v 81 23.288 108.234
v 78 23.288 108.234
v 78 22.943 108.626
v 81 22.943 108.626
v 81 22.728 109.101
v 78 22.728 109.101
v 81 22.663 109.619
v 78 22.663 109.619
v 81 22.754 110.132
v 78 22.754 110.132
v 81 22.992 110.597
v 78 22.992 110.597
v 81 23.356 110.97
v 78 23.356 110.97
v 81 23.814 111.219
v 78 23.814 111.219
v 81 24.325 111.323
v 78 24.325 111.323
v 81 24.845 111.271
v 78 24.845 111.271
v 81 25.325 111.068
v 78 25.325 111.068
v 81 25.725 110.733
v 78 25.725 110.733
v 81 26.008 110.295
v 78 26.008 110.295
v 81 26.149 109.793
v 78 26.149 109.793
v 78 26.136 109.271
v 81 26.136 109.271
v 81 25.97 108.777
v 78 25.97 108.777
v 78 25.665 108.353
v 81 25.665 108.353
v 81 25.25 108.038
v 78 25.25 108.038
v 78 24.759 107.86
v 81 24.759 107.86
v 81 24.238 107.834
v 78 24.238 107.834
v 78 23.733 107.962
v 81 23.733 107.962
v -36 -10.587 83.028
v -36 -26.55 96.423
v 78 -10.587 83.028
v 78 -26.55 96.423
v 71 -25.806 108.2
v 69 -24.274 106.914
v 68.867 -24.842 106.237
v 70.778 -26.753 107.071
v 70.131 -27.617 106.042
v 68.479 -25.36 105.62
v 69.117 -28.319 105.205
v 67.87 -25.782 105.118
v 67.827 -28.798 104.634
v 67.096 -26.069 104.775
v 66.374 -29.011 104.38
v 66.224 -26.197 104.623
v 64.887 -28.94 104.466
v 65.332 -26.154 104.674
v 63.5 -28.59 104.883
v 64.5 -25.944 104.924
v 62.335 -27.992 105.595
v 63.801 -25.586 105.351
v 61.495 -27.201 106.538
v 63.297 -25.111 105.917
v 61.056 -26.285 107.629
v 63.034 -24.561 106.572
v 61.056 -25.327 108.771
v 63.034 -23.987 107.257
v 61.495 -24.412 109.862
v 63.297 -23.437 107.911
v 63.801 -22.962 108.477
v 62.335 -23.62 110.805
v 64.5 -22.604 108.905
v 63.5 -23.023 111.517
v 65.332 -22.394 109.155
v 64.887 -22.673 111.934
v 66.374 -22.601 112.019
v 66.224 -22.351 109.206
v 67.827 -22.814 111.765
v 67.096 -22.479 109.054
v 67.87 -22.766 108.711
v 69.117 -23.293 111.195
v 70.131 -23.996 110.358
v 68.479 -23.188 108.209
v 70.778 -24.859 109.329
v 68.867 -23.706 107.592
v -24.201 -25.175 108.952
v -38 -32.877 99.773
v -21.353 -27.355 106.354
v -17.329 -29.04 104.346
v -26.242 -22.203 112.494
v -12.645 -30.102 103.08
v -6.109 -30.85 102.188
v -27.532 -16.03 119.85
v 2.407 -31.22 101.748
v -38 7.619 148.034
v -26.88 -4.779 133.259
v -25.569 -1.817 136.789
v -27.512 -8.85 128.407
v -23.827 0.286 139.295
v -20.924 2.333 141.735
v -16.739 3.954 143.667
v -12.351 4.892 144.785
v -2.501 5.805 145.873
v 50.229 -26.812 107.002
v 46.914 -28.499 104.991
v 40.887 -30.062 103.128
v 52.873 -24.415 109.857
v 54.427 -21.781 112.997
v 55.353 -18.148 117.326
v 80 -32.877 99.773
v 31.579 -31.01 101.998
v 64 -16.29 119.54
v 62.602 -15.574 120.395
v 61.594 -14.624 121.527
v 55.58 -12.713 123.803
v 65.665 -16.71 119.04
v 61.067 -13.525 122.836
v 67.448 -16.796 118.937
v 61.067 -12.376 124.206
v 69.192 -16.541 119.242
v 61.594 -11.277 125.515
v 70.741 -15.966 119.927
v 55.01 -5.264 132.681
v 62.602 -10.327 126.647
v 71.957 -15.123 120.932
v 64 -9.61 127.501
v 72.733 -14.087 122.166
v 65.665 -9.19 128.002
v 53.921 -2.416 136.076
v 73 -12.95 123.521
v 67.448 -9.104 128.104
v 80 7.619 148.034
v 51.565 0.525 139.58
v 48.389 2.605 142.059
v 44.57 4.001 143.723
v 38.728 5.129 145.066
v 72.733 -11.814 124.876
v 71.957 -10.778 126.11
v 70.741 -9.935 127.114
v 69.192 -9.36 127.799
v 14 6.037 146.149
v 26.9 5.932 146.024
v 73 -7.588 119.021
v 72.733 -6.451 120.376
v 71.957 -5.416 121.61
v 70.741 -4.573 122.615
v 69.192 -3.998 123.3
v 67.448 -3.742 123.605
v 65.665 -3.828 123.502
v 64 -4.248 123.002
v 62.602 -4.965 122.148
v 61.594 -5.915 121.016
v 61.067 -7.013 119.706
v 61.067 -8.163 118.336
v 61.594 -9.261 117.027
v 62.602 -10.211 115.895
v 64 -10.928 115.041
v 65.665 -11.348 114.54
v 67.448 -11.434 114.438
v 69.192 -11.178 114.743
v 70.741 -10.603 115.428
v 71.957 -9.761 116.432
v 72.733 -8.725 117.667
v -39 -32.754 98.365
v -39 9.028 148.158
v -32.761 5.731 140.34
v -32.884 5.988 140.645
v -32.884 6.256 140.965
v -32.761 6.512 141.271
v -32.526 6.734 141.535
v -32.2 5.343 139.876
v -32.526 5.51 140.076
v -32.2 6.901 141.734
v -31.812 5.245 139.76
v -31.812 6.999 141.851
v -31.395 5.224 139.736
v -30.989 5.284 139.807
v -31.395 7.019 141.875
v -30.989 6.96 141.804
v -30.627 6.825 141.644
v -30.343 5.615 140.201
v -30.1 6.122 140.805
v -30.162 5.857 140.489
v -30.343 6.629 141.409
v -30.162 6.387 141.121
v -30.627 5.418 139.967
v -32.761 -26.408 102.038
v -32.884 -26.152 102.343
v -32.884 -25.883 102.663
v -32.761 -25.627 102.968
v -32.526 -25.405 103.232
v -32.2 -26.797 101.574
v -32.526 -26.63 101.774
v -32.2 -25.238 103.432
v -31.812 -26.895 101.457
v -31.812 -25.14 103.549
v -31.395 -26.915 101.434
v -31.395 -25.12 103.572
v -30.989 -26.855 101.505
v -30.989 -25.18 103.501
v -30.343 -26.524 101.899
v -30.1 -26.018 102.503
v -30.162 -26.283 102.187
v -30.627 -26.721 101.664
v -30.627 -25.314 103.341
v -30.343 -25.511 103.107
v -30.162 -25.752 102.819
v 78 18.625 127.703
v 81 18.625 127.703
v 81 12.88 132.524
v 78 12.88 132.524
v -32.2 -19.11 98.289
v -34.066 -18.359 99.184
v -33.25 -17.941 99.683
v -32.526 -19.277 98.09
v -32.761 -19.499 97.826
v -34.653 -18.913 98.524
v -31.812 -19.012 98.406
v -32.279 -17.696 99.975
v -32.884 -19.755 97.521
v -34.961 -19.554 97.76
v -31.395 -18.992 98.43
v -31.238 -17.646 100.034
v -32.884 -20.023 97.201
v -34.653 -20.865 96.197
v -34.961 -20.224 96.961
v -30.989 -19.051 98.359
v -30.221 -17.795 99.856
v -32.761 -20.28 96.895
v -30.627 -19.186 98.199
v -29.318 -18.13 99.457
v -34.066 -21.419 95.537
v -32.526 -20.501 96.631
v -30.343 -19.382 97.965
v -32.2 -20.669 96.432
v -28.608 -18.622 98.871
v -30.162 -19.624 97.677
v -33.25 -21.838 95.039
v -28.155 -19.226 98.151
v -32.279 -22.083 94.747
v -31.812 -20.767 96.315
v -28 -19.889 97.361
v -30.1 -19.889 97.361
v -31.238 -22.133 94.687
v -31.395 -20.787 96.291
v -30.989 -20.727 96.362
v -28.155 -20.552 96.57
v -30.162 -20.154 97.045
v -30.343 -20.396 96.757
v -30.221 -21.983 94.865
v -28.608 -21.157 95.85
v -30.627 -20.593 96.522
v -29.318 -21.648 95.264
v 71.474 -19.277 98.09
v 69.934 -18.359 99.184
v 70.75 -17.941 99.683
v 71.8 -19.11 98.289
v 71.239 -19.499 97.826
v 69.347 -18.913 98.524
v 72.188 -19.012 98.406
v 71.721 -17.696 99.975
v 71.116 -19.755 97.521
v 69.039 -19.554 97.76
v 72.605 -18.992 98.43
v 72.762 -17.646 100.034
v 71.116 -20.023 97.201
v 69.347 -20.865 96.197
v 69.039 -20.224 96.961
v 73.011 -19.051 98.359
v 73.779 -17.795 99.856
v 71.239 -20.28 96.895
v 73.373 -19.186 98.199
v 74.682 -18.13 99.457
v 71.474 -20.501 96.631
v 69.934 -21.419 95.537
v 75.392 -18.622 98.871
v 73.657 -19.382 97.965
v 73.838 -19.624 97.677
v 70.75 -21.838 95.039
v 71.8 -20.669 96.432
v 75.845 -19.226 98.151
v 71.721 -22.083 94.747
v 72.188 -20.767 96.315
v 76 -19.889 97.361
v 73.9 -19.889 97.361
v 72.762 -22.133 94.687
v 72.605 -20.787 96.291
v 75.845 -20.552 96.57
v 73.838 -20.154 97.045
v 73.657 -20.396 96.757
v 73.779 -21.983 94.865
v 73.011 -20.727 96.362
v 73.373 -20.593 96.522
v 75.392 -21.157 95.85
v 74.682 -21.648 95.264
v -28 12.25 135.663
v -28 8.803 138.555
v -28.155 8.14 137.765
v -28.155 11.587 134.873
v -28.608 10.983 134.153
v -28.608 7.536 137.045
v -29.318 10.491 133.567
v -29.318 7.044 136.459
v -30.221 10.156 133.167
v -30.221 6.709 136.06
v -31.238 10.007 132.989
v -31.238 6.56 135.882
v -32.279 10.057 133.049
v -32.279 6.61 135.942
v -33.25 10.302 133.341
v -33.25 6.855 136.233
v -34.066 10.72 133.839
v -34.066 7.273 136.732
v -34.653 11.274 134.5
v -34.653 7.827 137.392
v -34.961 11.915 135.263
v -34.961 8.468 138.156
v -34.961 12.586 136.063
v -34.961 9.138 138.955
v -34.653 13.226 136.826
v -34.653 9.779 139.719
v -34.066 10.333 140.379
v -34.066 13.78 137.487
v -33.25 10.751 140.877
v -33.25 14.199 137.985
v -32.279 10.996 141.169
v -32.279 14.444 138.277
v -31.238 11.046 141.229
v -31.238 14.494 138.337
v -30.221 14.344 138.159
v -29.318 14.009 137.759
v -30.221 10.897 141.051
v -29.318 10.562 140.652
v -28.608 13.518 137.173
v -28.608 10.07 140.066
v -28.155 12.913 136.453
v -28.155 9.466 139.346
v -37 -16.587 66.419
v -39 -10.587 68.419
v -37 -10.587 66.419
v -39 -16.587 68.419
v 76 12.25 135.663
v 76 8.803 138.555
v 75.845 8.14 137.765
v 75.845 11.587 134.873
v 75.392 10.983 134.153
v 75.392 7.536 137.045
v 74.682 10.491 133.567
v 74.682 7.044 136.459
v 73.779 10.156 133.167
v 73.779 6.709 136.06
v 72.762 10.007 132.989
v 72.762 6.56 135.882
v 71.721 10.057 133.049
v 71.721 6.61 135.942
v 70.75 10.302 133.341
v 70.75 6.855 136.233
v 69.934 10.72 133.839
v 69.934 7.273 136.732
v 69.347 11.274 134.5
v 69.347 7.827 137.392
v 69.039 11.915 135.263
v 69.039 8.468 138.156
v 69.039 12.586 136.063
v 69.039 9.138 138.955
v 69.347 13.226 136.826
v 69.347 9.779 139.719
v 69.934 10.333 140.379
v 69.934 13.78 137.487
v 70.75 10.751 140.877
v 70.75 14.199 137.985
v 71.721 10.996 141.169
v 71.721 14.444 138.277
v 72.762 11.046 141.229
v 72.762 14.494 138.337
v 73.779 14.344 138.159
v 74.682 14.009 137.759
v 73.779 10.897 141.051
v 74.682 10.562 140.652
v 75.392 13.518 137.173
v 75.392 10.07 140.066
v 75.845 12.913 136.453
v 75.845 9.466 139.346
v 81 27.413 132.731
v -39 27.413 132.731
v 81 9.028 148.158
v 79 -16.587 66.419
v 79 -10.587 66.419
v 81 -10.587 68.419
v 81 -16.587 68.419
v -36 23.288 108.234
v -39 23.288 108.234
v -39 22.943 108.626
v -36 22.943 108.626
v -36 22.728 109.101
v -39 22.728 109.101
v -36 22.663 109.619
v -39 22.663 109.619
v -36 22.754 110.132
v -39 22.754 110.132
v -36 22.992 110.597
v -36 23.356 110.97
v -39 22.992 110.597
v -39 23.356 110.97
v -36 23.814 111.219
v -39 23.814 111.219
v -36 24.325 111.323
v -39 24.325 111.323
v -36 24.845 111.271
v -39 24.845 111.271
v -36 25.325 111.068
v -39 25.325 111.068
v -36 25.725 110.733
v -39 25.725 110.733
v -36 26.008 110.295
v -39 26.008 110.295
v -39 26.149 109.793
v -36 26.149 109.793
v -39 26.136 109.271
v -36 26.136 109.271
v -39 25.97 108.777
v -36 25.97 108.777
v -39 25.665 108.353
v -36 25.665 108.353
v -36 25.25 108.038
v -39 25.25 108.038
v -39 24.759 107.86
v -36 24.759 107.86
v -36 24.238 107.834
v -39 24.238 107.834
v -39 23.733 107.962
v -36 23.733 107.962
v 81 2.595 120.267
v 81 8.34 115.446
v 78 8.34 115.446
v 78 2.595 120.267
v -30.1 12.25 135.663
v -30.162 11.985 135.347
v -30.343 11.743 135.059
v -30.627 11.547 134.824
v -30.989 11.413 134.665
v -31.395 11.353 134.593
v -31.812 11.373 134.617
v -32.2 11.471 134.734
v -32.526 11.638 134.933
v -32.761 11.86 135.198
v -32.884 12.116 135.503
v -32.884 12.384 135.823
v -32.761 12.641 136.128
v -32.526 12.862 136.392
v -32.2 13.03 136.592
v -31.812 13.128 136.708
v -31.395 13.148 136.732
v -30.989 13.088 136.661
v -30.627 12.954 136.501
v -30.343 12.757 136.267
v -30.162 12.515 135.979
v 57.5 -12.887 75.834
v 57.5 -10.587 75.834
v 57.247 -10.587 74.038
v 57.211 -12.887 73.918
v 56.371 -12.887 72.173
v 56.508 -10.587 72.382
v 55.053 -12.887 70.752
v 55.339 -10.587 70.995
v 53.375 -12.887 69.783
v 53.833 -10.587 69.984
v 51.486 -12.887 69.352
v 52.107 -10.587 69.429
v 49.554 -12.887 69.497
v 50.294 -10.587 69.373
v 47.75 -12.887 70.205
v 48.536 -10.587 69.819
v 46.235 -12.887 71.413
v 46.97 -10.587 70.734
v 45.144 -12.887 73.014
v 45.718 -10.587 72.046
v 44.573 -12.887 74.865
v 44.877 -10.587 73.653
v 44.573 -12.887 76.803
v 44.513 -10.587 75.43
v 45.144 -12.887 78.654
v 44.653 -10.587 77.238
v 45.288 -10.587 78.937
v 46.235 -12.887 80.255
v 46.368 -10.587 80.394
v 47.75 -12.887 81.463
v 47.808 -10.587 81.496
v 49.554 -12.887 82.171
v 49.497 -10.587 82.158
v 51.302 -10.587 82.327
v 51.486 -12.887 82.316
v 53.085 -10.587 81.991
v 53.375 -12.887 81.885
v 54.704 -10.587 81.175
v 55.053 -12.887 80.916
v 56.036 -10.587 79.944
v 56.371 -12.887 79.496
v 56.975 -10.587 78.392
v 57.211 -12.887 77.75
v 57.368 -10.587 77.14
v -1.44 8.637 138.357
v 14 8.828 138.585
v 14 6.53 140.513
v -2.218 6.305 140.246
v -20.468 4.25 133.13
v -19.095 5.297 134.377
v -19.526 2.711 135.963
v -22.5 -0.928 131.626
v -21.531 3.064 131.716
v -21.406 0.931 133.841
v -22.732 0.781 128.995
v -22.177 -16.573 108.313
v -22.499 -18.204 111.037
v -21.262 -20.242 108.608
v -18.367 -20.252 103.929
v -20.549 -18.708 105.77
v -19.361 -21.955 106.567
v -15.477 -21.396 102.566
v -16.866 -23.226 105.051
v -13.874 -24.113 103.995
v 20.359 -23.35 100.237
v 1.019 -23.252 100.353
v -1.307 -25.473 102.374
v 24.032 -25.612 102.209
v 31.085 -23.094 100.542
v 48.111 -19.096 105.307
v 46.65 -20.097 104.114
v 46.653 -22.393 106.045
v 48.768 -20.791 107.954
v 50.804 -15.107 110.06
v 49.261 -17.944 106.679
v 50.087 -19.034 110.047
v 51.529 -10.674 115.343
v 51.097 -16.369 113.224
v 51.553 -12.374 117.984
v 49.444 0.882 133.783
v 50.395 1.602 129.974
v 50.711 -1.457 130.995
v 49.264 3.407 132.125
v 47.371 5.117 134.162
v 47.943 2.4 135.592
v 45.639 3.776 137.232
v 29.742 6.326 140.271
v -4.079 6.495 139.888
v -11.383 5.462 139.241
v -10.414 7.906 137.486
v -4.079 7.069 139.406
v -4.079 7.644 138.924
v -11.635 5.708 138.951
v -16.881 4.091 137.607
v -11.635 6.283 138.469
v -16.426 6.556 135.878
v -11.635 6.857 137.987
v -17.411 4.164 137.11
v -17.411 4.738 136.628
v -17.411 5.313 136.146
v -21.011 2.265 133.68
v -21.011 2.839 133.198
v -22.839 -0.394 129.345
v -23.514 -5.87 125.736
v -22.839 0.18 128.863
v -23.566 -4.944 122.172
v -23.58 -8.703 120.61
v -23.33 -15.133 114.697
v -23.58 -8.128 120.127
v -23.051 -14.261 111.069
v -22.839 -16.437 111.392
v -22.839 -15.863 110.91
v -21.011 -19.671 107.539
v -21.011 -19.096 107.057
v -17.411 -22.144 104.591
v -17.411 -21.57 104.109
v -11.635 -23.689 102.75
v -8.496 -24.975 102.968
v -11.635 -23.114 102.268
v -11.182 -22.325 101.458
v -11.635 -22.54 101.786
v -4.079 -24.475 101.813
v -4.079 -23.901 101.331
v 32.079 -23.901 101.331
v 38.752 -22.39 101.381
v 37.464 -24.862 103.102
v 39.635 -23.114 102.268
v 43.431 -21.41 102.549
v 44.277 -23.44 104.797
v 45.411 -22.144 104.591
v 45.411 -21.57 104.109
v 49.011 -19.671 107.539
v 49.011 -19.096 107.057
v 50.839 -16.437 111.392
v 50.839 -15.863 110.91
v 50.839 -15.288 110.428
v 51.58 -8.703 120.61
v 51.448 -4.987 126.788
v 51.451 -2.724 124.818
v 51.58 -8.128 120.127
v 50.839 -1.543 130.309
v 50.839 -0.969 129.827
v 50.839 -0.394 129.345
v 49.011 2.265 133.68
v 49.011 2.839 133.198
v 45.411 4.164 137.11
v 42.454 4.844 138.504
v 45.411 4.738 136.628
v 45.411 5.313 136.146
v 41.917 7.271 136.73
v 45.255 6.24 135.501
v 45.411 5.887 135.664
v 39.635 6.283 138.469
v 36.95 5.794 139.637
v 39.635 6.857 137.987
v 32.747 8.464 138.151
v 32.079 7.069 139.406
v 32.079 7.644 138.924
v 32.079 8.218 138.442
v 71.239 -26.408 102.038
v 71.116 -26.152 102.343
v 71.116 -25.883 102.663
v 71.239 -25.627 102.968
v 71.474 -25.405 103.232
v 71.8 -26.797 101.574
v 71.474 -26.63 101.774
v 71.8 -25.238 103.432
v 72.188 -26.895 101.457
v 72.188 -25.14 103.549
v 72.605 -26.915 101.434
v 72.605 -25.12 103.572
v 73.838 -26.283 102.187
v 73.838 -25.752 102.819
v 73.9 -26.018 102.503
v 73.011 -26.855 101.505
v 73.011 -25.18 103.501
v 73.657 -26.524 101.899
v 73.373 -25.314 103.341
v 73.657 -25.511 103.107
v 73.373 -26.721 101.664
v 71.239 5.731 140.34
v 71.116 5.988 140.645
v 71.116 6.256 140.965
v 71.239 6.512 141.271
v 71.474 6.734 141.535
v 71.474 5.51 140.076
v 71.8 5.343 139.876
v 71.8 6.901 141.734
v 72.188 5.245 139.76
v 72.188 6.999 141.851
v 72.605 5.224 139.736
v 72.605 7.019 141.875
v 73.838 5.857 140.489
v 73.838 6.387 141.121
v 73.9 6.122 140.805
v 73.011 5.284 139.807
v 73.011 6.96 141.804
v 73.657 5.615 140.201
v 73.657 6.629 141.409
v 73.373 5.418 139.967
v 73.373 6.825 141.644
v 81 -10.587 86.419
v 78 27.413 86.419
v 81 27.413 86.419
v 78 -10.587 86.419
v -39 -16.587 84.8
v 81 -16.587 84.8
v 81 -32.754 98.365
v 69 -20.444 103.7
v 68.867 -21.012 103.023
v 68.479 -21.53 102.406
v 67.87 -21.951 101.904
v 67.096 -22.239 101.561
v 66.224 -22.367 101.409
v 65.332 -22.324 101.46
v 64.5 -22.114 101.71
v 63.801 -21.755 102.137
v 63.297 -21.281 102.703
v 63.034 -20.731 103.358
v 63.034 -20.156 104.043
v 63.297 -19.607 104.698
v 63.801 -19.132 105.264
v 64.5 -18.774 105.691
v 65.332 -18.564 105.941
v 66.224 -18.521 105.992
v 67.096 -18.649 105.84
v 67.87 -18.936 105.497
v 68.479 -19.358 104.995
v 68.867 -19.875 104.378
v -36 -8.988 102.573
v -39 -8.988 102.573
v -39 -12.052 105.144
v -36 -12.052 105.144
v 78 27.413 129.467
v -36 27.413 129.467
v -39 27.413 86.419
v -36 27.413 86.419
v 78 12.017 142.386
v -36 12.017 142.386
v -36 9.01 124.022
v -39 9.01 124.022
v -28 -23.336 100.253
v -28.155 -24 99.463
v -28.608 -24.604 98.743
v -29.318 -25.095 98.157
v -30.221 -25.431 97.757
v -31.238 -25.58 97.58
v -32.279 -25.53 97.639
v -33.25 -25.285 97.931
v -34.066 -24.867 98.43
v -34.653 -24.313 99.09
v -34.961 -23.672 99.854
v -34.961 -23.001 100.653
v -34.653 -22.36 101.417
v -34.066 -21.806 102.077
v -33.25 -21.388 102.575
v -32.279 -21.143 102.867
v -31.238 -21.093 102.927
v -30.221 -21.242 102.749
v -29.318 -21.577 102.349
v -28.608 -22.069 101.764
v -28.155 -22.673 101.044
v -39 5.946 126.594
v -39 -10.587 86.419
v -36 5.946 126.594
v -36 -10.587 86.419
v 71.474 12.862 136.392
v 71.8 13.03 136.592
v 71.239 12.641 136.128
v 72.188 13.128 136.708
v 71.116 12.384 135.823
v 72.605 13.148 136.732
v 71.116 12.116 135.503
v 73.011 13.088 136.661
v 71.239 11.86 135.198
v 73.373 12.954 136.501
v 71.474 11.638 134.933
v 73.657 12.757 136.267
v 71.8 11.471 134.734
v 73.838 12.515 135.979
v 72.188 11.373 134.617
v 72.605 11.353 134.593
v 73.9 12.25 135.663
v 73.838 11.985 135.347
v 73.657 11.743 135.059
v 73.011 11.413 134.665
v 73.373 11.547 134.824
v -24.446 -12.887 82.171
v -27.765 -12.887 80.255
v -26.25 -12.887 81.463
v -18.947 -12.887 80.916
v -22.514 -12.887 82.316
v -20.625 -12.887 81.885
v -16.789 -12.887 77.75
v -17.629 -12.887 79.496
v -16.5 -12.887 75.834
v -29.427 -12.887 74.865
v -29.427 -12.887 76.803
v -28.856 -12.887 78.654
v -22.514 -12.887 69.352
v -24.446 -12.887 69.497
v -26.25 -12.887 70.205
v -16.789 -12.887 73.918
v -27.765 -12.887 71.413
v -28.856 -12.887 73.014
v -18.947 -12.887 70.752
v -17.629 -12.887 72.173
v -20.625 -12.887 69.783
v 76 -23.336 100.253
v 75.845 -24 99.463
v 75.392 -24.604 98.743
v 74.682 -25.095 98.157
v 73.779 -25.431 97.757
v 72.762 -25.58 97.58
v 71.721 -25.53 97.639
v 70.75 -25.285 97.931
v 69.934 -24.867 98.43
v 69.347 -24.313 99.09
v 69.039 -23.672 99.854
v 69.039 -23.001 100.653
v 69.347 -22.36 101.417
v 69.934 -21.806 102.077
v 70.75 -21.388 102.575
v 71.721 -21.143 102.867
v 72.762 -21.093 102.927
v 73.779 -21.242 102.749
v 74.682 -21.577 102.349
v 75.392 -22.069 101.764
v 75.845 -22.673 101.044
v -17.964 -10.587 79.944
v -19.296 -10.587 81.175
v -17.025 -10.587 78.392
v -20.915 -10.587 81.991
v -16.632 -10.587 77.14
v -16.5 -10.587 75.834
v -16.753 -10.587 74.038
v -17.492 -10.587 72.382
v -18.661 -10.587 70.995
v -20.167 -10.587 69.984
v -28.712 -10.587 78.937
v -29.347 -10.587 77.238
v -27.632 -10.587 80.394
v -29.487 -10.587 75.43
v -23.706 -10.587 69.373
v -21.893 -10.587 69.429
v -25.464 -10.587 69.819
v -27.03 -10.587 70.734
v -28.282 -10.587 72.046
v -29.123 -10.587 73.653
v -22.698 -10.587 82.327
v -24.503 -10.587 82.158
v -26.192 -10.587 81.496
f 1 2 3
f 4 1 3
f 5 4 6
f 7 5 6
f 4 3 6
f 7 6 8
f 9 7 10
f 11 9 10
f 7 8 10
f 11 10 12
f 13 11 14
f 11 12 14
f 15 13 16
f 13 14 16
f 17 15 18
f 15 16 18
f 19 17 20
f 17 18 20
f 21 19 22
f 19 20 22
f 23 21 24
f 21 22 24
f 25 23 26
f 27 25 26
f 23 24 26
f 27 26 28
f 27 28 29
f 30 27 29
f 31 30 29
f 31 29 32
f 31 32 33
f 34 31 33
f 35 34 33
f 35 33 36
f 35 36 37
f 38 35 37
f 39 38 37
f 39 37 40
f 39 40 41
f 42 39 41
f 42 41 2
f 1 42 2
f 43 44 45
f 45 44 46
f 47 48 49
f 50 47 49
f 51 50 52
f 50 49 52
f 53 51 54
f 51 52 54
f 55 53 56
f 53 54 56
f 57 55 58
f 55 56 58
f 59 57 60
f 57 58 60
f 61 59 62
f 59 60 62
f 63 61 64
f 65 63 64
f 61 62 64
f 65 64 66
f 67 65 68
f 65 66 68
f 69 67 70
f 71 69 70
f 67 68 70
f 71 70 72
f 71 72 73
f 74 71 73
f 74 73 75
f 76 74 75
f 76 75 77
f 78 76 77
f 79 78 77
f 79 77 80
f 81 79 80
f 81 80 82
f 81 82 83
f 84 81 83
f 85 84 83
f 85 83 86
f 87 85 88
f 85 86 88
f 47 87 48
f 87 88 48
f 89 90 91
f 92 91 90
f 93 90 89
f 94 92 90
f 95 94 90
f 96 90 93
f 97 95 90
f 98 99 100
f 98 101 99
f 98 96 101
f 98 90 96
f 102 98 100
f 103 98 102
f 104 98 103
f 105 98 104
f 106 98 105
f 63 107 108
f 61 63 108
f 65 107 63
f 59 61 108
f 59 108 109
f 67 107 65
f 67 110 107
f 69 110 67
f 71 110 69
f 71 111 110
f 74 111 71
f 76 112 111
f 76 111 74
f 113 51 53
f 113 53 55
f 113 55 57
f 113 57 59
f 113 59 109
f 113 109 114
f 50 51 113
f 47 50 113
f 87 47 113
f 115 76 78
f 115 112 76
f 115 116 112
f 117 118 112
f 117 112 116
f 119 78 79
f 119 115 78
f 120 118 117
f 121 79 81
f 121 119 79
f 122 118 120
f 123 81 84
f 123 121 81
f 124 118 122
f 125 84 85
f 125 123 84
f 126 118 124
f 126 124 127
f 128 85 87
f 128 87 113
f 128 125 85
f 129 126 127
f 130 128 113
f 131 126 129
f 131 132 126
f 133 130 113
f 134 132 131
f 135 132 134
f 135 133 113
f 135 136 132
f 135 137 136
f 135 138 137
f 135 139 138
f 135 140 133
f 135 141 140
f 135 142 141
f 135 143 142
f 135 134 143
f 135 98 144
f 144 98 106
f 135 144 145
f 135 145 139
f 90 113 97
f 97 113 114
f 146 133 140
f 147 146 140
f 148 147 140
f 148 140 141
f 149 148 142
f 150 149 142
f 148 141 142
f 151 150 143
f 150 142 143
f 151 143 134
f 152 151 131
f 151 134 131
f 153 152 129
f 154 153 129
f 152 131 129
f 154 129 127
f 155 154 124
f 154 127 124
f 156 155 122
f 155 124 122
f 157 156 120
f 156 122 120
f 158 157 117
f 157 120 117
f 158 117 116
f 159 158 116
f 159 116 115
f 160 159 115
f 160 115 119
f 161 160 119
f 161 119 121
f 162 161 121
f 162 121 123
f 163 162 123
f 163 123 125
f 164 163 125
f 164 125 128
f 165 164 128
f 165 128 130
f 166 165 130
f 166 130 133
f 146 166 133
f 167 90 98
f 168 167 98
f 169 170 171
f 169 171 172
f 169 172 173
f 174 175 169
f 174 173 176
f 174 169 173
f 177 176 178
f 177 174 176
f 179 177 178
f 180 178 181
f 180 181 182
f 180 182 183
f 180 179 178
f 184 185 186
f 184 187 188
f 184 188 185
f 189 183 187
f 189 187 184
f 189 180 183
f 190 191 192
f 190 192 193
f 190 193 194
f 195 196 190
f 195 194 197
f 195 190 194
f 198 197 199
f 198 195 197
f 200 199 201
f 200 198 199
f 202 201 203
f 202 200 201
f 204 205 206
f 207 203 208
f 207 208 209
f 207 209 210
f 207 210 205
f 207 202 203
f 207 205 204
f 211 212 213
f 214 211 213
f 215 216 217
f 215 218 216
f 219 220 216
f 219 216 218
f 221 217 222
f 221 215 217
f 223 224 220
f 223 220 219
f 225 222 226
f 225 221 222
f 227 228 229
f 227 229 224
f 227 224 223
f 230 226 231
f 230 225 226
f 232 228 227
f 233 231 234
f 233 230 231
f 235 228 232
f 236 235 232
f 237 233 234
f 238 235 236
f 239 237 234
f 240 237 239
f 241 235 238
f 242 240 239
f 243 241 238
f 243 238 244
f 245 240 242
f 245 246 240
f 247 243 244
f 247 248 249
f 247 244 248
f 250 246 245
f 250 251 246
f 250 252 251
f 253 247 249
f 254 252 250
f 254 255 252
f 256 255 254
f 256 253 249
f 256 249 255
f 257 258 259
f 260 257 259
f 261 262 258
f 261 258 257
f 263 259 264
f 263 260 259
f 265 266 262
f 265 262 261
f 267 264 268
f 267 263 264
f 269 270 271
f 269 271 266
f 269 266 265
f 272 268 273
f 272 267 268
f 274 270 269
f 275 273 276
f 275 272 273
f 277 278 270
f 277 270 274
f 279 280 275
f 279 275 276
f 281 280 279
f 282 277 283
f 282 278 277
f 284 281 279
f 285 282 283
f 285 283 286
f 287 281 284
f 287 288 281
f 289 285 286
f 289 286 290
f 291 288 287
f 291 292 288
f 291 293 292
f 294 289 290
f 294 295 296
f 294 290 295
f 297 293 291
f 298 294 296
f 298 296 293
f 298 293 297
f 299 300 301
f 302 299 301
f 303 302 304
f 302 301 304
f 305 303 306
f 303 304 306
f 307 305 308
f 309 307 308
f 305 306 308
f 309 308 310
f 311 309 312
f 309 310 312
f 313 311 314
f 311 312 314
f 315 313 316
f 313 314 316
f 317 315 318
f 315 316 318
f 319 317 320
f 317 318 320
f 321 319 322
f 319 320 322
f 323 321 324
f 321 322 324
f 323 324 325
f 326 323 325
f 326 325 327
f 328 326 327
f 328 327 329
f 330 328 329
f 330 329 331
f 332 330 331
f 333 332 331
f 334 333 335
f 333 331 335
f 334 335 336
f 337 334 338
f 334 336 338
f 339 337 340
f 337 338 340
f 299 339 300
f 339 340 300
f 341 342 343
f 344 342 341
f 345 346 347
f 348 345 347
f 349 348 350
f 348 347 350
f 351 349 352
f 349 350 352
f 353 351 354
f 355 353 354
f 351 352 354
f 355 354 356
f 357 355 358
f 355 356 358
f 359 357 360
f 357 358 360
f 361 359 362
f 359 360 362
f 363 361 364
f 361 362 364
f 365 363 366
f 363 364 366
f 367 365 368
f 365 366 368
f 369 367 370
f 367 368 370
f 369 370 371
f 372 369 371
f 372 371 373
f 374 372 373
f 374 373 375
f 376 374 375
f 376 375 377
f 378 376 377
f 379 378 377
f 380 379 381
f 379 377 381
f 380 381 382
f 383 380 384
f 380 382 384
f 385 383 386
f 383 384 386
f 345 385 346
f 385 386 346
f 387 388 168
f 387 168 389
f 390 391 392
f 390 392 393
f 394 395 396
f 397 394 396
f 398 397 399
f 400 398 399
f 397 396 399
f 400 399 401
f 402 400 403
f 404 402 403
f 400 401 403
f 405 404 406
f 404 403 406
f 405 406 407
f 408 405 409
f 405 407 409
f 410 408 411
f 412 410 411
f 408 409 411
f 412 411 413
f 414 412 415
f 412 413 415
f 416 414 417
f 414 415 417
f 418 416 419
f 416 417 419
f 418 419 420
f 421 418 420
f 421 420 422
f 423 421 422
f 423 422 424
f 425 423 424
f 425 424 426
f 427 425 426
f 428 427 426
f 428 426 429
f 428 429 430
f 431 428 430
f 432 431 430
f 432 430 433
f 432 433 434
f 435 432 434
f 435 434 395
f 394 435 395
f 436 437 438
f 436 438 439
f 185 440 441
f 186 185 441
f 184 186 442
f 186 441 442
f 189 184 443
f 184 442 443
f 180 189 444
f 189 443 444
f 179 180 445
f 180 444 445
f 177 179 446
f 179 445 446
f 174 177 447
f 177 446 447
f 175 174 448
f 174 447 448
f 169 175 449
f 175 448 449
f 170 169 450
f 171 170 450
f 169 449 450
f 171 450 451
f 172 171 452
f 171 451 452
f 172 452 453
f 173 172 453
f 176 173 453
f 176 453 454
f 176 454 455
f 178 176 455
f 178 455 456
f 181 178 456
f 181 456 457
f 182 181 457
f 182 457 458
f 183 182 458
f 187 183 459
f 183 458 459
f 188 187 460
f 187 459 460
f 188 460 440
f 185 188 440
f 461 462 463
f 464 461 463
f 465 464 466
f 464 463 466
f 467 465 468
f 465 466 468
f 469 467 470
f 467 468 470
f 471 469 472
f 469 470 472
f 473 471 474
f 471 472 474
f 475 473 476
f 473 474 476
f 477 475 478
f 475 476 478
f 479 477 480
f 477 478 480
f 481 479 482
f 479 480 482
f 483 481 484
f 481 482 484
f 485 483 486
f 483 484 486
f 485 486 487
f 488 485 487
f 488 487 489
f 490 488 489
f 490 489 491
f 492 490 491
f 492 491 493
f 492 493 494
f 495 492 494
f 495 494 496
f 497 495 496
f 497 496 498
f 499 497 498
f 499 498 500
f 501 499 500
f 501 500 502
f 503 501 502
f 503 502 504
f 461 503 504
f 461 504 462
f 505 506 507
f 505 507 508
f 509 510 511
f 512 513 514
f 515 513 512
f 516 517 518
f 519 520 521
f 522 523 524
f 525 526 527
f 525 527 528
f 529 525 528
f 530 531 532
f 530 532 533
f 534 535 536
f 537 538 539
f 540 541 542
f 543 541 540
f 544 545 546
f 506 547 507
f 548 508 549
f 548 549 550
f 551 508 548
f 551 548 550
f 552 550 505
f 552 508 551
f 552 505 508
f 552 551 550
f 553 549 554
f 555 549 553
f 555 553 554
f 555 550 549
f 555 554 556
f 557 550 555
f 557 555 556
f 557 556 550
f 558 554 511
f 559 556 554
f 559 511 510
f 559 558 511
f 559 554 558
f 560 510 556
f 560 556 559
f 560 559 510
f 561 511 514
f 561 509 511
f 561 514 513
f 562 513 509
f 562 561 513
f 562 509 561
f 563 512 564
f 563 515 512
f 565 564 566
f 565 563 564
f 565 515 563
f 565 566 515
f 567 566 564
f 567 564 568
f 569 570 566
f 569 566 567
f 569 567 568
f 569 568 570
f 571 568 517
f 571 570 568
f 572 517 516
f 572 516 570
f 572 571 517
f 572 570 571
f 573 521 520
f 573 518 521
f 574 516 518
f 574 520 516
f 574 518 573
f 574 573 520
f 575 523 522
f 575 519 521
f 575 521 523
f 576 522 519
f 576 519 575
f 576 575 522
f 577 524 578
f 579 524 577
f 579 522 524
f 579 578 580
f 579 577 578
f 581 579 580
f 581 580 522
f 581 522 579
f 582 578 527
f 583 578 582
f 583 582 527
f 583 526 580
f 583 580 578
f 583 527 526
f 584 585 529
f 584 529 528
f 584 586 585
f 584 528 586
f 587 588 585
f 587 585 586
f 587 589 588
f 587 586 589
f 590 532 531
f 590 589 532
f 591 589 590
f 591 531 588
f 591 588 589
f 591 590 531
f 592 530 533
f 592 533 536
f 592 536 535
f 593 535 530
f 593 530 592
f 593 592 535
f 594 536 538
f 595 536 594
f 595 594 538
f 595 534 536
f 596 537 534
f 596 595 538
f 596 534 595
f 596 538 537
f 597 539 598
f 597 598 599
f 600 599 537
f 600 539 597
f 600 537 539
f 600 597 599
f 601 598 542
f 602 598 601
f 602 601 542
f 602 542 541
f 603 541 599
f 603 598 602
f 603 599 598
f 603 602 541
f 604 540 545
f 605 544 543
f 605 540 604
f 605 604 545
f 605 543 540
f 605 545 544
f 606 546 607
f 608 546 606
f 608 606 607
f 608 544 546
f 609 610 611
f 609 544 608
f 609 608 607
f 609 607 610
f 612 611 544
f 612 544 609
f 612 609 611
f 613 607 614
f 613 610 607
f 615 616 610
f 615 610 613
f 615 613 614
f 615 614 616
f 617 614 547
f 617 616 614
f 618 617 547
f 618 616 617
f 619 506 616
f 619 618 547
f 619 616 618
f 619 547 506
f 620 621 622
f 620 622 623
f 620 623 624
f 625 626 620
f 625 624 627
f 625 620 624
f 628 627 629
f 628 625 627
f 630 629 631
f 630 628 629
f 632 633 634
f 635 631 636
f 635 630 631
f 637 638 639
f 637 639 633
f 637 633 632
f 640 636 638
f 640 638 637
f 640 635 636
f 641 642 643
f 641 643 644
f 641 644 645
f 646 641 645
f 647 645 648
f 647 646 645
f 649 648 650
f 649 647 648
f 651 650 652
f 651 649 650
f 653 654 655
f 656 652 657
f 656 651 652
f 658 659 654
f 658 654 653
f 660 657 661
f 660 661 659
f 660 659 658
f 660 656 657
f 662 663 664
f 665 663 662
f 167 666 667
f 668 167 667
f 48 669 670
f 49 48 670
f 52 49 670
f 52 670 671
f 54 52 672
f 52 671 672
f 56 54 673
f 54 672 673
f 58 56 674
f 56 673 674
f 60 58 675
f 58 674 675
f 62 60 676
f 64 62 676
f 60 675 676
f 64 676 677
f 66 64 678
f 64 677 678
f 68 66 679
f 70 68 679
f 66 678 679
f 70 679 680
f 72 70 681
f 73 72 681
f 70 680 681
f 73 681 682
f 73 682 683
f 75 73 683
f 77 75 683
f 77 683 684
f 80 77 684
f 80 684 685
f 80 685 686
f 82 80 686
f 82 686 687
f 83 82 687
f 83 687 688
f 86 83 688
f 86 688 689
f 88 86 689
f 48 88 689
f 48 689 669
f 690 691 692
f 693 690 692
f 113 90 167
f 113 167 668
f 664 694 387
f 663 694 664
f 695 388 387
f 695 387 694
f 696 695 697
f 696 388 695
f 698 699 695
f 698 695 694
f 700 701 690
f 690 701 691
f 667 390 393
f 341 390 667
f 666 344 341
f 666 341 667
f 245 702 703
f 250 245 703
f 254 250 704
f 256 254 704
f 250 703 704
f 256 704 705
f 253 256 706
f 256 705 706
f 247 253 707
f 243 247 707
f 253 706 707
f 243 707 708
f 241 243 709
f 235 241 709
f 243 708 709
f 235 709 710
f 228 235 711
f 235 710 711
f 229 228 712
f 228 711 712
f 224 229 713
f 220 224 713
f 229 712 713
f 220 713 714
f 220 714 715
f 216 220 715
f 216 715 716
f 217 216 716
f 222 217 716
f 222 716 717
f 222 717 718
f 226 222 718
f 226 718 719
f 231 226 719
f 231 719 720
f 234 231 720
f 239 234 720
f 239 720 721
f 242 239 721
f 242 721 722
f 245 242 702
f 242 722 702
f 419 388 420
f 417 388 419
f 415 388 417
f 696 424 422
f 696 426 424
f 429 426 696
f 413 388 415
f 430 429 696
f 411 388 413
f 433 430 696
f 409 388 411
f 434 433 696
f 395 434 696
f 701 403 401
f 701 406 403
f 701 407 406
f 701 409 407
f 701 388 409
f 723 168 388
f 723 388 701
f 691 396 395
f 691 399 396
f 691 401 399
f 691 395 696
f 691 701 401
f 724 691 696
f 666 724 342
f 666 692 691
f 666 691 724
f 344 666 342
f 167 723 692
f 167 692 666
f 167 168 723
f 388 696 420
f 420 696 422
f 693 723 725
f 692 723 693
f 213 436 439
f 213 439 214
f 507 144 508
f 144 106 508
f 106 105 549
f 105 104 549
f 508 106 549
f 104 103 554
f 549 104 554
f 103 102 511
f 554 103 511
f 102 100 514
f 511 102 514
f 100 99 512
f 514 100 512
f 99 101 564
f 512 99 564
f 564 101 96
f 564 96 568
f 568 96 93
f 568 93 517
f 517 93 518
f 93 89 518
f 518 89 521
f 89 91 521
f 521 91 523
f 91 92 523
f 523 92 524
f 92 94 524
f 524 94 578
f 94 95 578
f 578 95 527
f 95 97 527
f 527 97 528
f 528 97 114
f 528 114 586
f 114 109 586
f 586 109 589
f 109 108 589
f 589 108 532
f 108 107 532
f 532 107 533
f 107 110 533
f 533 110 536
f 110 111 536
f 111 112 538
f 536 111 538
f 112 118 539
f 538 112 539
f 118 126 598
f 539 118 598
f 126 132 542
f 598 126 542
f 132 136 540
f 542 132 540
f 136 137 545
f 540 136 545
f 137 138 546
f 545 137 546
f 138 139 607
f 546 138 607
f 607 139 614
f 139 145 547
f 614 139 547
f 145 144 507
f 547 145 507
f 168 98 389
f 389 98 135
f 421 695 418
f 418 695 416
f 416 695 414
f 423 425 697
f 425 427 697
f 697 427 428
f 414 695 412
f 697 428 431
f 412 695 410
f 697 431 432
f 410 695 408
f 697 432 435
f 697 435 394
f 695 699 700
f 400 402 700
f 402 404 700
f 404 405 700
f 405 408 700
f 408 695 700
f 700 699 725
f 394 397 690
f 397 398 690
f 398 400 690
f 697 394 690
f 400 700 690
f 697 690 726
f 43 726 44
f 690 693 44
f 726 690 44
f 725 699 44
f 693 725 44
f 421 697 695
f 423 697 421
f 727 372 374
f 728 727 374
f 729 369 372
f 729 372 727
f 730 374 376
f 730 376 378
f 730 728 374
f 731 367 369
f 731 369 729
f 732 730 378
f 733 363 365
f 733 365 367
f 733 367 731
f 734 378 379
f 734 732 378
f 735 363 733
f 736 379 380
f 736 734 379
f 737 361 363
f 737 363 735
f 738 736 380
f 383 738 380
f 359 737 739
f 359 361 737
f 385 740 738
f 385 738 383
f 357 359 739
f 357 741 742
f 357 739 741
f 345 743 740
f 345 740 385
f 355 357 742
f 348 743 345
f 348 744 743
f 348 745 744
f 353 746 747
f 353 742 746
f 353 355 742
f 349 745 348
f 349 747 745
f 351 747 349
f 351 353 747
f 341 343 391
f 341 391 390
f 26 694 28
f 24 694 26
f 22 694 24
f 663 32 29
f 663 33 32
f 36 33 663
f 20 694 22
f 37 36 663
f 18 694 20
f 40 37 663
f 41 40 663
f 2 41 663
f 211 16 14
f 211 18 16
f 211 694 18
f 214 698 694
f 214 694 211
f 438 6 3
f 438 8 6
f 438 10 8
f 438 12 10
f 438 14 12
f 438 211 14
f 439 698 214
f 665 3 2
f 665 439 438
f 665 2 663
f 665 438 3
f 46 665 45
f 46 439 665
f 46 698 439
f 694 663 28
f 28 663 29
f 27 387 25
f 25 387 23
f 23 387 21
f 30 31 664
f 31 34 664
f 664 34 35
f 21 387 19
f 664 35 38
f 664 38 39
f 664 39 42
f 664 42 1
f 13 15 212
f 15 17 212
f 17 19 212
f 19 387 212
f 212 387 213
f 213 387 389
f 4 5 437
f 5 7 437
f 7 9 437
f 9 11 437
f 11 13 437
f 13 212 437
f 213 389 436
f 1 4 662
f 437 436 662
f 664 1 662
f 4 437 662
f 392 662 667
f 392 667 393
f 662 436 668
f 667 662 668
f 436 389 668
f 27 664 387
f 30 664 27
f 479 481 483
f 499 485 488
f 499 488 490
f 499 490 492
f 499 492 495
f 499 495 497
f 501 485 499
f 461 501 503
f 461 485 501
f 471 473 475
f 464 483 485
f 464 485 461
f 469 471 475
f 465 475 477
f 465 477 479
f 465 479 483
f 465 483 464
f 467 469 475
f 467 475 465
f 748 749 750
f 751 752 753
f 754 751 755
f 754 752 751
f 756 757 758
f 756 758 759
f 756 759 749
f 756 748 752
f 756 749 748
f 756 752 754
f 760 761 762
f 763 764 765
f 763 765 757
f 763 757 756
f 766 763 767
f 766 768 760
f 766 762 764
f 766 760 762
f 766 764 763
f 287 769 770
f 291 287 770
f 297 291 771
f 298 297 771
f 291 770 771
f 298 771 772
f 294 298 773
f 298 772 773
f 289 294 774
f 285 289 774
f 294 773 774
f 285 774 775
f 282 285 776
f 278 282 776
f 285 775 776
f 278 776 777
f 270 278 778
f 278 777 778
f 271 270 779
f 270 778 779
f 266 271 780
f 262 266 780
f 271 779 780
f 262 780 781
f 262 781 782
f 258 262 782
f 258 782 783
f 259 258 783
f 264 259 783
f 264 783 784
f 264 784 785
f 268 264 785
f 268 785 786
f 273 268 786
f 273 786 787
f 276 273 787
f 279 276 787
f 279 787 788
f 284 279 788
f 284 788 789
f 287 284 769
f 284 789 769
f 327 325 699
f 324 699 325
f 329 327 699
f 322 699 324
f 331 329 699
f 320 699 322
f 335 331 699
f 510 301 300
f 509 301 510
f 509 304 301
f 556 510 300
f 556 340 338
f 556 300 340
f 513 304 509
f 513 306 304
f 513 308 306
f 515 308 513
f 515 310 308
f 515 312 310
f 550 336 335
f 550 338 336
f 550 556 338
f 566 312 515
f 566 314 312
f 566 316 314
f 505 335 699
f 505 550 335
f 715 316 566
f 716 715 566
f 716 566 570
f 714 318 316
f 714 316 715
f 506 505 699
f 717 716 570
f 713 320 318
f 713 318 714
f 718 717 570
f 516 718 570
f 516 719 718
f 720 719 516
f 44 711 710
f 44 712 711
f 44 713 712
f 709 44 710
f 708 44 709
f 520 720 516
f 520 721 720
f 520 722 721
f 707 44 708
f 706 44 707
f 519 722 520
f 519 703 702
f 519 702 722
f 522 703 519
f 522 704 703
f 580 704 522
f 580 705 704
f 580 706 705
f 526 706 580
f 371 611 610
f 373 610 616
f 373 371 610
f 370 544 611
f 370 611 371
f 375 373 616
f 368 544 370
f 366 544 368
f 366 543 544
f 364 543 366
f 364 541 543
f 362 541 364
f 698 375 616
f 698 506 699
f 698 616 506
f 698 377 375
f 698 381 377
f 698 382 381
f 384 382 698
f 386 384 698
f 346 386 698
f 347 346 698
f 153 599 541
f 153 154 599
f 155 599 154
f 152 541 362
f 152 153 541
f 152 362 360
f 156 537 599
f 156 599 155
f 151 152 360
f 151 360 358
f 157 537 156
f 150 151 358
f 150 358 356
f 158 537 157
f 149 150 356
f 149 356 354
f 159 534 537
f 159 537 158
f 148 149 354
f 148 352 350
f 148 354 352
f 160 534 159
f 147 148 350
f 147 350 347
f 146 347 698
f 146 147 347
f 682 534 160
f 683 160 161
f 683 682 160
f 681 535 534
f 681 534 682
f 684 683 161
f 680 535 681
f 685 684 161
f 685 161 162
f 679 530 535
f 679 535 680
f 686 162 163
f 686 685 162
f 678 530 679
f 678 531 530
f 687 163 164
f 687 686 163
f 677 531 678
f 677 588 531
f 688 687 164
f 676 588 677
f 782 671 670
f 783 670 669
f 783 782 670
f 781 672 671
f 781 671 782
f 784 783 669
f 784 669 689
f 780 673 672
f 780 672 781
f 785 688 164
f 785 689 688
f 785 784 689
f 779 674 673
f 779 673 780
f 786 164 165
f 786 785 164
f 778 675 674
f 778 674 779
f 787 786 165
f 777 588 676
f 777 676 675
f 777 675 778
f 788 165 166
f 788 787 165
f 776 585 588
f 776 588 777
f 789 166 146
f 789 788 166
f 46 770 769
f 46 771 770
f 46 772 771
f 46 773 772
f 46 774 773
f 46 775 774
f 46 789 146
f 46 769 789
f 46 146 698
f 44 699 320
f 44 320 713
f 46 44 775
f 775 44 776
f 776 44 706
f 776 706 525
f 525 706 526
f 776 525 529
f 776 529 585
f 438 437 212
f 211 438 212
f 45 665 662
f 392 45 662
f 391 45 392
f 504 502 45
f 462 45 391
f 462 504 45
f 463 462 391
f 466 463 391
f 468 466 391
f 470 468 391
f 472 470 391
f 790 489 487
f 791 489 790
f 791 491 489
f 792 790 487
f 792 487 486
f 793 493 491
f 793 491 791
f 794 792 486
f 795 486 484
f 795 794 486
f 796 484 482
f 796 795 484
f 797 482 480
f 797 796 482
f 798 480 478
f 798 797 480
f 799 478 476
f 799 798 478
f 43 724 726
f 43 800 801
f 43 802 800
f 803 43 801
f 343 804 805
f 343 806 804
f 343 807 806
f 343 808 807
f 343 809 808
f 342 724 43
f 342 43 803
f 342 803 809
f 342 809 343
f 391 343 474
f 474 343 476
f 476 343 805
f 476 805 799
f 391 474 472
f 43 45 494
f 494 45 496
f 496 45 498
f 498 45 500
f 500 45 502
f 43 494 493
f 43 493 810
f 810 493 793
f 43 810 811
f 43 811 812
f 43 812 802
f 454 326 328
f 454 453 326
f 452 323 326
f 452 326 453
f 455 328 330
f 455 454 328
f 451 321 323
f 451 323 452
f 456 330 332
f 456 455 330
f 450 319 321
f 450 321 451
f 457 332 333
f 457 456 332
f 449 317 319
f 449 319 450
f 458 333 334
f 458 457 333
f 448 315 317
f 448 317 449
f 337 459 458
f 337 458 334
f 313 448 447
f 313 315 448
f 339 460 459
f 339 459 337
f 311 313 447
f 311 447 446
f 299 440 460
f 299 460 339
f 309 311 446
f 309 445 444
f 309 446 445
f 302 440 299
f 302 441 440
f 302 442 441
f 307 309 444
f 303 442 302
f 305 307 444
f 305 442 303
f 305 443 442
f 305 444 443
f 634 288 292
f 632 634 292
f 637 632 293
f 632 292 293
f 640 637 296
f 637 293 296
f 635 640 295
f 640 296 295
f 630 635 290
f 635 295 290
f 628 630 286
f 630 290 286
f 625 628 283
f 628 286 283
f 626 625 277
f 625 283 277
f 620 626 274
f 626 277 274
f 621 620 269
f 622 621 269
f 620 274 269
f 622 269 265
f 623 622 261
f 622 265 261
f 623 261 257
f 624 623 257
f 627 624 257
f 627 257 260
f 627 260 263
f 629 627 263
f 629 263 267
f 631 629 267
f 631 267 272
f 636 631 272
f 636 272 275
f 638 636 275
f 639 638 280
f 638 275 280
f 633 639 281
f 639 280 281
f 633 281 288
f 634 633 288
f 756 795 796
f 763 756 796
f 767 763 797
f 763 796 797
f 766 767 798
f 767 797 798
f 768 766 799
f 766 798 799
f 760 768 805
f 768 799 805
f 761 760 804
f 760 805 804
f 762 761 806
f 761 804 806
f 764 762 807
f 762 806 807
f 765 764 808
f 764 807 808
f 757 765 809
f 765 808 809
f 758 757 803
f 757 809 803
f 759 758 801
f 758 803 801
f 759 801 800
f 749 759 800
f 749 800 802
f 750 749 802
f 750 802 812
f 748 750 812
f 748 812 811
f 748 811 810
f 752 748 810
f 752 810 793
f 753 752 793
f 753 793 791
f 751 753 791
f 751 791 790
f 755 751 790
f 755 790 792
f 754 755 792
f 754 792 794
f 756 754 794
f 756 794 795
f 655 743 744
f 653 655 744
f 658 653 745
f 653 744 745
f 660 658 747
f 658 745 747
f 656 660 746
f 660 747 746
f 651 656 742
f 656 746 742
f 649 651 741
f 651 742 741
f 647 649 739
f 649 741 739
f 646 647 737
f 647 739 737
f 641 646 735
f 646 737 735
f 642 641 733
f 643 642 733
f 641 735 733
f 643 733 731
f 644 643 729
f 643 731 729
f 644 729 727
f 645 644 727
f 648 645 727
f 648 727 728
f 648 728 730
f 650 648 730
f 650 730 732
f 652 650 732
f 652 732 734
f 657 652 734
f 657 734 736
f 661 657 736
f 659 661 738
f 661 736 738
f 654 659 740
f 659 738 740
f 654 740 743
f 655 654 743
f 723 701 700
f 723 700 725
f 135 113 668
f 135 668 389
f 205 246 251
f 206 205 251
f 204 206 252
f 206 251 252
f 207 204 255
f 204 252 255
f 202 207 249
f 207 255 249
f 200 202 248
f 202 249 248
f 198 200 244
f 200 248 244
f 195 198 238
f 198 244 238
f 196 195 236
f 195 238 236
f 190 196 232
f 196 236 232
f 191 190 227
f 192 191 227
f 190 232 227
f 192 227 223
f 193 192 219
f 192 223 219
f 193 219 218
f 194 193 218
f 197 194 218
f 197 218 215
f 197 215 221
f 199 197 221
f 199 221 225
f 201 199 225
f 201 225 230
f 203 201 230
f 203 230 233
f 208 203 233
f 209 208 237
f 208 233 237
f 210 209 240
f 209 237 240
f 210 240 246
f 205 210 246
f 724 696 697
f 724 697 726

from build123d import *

# Parameters (mm, degrees)
SKETCH029_W             = 120
SKETCH029_H             = 65
PAD005_DEPTH            = 25
SKETCH028_R             = 3
POCKET016_DEPTH         = 25.001
SKETCH001_R             = 6
POCKET017_DEPTH         = 25.001
SKETCH030_W             = 114
SKETCH030_H             = 60
POCKET018_DEPTH         = 18
CHAMFER001_SIZE         = 4
SKETCH031_R             = 3.5
PAD006_DEPTH            = 4.5
SKETCH032_R             = 1.4
POCKET019_DEPTH         = 8
SKETCH033_W             = 16
SKETCH033_H             = 6.5
POCKET020_DEPTH         = 9
SKETCH034_W             = 28
SKETCH034_H             = 4
POCKET021_DEPTH         = 5
PAD007_DEPTH            = 120
SKETCH027_W             = 114
SKETCH027_H             = 60
POCKET022_DEPTH         = 47
SKETCH016_W             = 16
SKETCH016_H             = 7.5
POCKET023_DEPTH         = 9
CHAMFER002_SIZE         = 2
SKETCH022_R             = 1.75
POCKET024_DEPTH         = 120.001
CHAMFER005_SIZE         = 2
CHAMFER006_SIZE         = 2
SKETCH023_R             = 6.5
POCKET025_DEPTH         = 2.3
CHAMFER007_SIZE         = 1
BODY002_PLACEMENT_ANGLE = 50


with BuildPart() as part:
    # Sketch029 → Pad005 (new body)
    with BuildSketch(Plane.XY):
        with Locations((7, 0)):
            Rectangle(SKETCH029_W, SKETCH029_H)
        with BuildLine():
            add(Edge.make_bspline(
                [(0, 25.038668), (-12.580271, 25.038668), (-37.740814, 25.116003), (-37.5, 0), (-37.740814, -25.116003), (0, -25), (37.740814, -25.116003), (37.5, 0), (37.740814, 25.116003), (12.580271, 25.038668), (0, 25.038668)],
                knots=[0, 0, 0, 0, 0.125, 0.25, 0.375, 0.5, 0.625, 0.75, 0.875, 1, 1, 1, 1], degree=3))
        make_face(mode=Mode.SUBTRACT)
    extrude(amount=PAD005_DEPTH)

    # Sketch028 → Pocket016 (cut, through all)
    with BuildSketch(Plane(origin=(0, 0, 0), x_dir=(1, 0, 0), z_dir=(0, 0, -1))):
        with Locations((52, 20.5)):
            Circle(SKETCH028_R)
    extrude(amount=-POCKET016_DEPTH, mode=Mode.SUBTRACT)

    # Sketch001 (on Face5 of Pocket016) → Pocket017 (cut, through all)
    with BuildSketch(Plane.XY.offset(25)):
        with Locations((53, -0.5)):
            Circle(SKETCH001_R)
    extrude(amount=-POCKET017_DEPTH, mode=Mode.SUBTRACT)

    # Sketch030 (on Face4 of Pocket017) → Pocket018 (cut)
    with BuildSketch(Plane(origin=(0, 0, 0), x_dir=(1, 0, 0), z_dir=(0, 0, -1))):
        with Locations((7, 0)):
            Rectangle(SKETCH030_W, SKETCH030_H)
    extrude(amount=-POCKET018_DEPTH, mode=Mode.SUBTRACT)

    # Chamfer001
    chamfer001_edges = [part.edges().sort_by_distance(p)[0] for p in [
        (0, -25.038668, 25),
    ]]
    chamfer(chamfer001_edges, length=CHAMFER001_SIZE)

    # Sketch031 (on Face11 of Chamfer001) → Pad006 (join)
    with BuildSketch(Plane(origin=(0, 0, 18), x_dir=(1, 0, 0), z_dir=(0, 0, -1))):
        with Locations((-45.5, 25)):
            Circle(SKETCH031_R)
        with Locations((-45.5, -25)):
            Circle(SKETCH031_R)
        with Locations((58.5, -25)):
            Circle(SKETCH031_R)
        with Locations((58.5, 25)):
            Circle(SKETCH031_R)
    extrude(amount=PAD006_DEPTH)

    # Sketch032 (on Face22 of Pad006) → Pocket019 (cut)
    with BuildSketch(Plane(origin=(0, 0, 13.5), x_dir=(1, 0, 0), z_dir=(0, 0, -1))):
        with Locations((-45.5, 25)):
            Circle(SKETCH032_R)
        with Locations((58.5, 25)):
            Circle(SKETCH032_R)
        with Locations((58.5, -25)):
            Circle(SKETCH032_R)
        with Locations((-45.5, -25)):
            Circle(SKETCH032_R)
    extrude(amount=-POCKET019_DEPTH, mode=Mode.SUBTRACT)

    # Sketch033 (on Face5 of Pocket019) → Pocket020 (cut)
    with BuildSketch(Plane.YZ.offset(67)):
        with Locations((15, 3.25)):
            Rectangle(SKETCH033_W, SKETCH033_H)
    extrude(amount=-POCKET020_DEPTH, mode=Mode.SUBTRACT)

    # Sketch034 (on Face4 of Pocket020) → Pocket021 (cut)
    with BuildSketch(Plane(origin=(-53, 0, 0), x_dir=(0, -1, 0), z_dir=(-1, 0, 0))):
        with Locations((0, 10.5)):
            Rectangle(SKETCH034_W, SKETCH034_H)
    extrude(amount=-POCKET021_DEPTH, mode=Mode.SUBTRACT)

    # Sketch010 (on Face4 of Pocket021) → Pad007 (join)
    with BuildSketch(Plane(origin=(-53, 0, 0), x_dir=(0, -1, 0), z_dir=(-1, 0, 0))):
        Polygon((2.976444, -29.768271), (27.402373, -0.658582), (42.723262, -13.514335), (46.579988, -8.918068), (27.480858, 7.108005), (-32.5, 7.108005), (-32.5, 0), align=None)
    extrude(amount=-PAD007_DEPTH)

    # Sketch027 → Pocket022 (cut)
    with BuildSketch(Plane(origin=(0, 0, 13.5), x_dir=(1, 0, 0), z_dir=(0, 0, -1))):
        with Locations((7, 0)):
            Rectangle(SKETCH027_W, SKETCH027_H)
    extrude(amount=POCKET022_DEPTH, mode=Mode.SUBTRACT)

    # Sketch016 (on Face5 of Pocket022) → Pocket023 (cut)
    with BuildSketch(Plane.YZ.offset(67)):
        with Locations((15, 7.25)):
            Rectangle(SKETCH016_W, SKETCH016_H)
    extrude(amount=-POCKET023_DEPTH, mode=Mode.SUBTRACT)

    # Chamfer002
    chamfer002_edges = [part.edges().sort_by_distance(p)[0] for p in [
        (49, -20.5, 25),
    ]]
    chamfer(chamfer002_edges, length=CHAMFER002_SIZE)

    # Sketch022 (on Face25 of Chamfer002) → Pocket024 (cut, through all)
    with BuildSketch(Plane(origin=(-53, 0, 0), x_dir=(0, -1, 0), z_dir=(-1, 0, 0))):
        with Locations((-12.833415, -12.586002)):
            Circle(SKETCH022_R)
    extrude(amount=-POCKET024_DEPTH, mode=Mode.SUBTRACT)

    # Chamfer005
    chamfer005_edges = [part.edges().sort_by_distance(p)[0] for p in [
        (67, -44.651625, -11.216201),
    ]]
    chamfer(chamfer005_edges, length=CHAMFER005_SIZE)

    # Chamfer006
    chamfer006_edges = [part.edges().sort_by_distance(p)[0] for p in [
        (-53, -44.651625, -11.216201),
    ]]
    chamfer(chamfer006_edges, length=CHAMFER006_SIZE)

    # Sketch023 (on Face8 of Chamfer006) → Pocket025 (cut)
    with BuildSketch(Plane(origin=(0, -10.997712, 13.106563), x_dir=(1, 0, 0), z_dir=(0, 0.642788, -0.766044))):
        with Locations((-37, 32)):
            Circle(SKETCH023_R)
        with Locations((37, 32)):
            Circle(SKETCH023_R)
    extrude(amount=-POCKET025_DEPTH, mode=Mode.SUBTRACT)

    # Chamfer007
    chamfer007_edges = [part.edges().sort_by_distance(p)[0] for p in [
        (7, 32.5, 25),
        (67, 0, 25),
        (7, -32.5, 25),
        (-53, 0, 25),
    ]]
    chamfer(chamfer007_edges, length=CHAMFER007_SIZE)


with BuildPart() as part_1:
    # Body002 placement: moved
    add(part.part.moved(Location((14, 6.522108, 107.834158))).rotate(Axis((14, 6.522108, 107.834158), (1, 0, 0)), BODY002_PLACEMENT_ANGLE))


solid = part_1.part
